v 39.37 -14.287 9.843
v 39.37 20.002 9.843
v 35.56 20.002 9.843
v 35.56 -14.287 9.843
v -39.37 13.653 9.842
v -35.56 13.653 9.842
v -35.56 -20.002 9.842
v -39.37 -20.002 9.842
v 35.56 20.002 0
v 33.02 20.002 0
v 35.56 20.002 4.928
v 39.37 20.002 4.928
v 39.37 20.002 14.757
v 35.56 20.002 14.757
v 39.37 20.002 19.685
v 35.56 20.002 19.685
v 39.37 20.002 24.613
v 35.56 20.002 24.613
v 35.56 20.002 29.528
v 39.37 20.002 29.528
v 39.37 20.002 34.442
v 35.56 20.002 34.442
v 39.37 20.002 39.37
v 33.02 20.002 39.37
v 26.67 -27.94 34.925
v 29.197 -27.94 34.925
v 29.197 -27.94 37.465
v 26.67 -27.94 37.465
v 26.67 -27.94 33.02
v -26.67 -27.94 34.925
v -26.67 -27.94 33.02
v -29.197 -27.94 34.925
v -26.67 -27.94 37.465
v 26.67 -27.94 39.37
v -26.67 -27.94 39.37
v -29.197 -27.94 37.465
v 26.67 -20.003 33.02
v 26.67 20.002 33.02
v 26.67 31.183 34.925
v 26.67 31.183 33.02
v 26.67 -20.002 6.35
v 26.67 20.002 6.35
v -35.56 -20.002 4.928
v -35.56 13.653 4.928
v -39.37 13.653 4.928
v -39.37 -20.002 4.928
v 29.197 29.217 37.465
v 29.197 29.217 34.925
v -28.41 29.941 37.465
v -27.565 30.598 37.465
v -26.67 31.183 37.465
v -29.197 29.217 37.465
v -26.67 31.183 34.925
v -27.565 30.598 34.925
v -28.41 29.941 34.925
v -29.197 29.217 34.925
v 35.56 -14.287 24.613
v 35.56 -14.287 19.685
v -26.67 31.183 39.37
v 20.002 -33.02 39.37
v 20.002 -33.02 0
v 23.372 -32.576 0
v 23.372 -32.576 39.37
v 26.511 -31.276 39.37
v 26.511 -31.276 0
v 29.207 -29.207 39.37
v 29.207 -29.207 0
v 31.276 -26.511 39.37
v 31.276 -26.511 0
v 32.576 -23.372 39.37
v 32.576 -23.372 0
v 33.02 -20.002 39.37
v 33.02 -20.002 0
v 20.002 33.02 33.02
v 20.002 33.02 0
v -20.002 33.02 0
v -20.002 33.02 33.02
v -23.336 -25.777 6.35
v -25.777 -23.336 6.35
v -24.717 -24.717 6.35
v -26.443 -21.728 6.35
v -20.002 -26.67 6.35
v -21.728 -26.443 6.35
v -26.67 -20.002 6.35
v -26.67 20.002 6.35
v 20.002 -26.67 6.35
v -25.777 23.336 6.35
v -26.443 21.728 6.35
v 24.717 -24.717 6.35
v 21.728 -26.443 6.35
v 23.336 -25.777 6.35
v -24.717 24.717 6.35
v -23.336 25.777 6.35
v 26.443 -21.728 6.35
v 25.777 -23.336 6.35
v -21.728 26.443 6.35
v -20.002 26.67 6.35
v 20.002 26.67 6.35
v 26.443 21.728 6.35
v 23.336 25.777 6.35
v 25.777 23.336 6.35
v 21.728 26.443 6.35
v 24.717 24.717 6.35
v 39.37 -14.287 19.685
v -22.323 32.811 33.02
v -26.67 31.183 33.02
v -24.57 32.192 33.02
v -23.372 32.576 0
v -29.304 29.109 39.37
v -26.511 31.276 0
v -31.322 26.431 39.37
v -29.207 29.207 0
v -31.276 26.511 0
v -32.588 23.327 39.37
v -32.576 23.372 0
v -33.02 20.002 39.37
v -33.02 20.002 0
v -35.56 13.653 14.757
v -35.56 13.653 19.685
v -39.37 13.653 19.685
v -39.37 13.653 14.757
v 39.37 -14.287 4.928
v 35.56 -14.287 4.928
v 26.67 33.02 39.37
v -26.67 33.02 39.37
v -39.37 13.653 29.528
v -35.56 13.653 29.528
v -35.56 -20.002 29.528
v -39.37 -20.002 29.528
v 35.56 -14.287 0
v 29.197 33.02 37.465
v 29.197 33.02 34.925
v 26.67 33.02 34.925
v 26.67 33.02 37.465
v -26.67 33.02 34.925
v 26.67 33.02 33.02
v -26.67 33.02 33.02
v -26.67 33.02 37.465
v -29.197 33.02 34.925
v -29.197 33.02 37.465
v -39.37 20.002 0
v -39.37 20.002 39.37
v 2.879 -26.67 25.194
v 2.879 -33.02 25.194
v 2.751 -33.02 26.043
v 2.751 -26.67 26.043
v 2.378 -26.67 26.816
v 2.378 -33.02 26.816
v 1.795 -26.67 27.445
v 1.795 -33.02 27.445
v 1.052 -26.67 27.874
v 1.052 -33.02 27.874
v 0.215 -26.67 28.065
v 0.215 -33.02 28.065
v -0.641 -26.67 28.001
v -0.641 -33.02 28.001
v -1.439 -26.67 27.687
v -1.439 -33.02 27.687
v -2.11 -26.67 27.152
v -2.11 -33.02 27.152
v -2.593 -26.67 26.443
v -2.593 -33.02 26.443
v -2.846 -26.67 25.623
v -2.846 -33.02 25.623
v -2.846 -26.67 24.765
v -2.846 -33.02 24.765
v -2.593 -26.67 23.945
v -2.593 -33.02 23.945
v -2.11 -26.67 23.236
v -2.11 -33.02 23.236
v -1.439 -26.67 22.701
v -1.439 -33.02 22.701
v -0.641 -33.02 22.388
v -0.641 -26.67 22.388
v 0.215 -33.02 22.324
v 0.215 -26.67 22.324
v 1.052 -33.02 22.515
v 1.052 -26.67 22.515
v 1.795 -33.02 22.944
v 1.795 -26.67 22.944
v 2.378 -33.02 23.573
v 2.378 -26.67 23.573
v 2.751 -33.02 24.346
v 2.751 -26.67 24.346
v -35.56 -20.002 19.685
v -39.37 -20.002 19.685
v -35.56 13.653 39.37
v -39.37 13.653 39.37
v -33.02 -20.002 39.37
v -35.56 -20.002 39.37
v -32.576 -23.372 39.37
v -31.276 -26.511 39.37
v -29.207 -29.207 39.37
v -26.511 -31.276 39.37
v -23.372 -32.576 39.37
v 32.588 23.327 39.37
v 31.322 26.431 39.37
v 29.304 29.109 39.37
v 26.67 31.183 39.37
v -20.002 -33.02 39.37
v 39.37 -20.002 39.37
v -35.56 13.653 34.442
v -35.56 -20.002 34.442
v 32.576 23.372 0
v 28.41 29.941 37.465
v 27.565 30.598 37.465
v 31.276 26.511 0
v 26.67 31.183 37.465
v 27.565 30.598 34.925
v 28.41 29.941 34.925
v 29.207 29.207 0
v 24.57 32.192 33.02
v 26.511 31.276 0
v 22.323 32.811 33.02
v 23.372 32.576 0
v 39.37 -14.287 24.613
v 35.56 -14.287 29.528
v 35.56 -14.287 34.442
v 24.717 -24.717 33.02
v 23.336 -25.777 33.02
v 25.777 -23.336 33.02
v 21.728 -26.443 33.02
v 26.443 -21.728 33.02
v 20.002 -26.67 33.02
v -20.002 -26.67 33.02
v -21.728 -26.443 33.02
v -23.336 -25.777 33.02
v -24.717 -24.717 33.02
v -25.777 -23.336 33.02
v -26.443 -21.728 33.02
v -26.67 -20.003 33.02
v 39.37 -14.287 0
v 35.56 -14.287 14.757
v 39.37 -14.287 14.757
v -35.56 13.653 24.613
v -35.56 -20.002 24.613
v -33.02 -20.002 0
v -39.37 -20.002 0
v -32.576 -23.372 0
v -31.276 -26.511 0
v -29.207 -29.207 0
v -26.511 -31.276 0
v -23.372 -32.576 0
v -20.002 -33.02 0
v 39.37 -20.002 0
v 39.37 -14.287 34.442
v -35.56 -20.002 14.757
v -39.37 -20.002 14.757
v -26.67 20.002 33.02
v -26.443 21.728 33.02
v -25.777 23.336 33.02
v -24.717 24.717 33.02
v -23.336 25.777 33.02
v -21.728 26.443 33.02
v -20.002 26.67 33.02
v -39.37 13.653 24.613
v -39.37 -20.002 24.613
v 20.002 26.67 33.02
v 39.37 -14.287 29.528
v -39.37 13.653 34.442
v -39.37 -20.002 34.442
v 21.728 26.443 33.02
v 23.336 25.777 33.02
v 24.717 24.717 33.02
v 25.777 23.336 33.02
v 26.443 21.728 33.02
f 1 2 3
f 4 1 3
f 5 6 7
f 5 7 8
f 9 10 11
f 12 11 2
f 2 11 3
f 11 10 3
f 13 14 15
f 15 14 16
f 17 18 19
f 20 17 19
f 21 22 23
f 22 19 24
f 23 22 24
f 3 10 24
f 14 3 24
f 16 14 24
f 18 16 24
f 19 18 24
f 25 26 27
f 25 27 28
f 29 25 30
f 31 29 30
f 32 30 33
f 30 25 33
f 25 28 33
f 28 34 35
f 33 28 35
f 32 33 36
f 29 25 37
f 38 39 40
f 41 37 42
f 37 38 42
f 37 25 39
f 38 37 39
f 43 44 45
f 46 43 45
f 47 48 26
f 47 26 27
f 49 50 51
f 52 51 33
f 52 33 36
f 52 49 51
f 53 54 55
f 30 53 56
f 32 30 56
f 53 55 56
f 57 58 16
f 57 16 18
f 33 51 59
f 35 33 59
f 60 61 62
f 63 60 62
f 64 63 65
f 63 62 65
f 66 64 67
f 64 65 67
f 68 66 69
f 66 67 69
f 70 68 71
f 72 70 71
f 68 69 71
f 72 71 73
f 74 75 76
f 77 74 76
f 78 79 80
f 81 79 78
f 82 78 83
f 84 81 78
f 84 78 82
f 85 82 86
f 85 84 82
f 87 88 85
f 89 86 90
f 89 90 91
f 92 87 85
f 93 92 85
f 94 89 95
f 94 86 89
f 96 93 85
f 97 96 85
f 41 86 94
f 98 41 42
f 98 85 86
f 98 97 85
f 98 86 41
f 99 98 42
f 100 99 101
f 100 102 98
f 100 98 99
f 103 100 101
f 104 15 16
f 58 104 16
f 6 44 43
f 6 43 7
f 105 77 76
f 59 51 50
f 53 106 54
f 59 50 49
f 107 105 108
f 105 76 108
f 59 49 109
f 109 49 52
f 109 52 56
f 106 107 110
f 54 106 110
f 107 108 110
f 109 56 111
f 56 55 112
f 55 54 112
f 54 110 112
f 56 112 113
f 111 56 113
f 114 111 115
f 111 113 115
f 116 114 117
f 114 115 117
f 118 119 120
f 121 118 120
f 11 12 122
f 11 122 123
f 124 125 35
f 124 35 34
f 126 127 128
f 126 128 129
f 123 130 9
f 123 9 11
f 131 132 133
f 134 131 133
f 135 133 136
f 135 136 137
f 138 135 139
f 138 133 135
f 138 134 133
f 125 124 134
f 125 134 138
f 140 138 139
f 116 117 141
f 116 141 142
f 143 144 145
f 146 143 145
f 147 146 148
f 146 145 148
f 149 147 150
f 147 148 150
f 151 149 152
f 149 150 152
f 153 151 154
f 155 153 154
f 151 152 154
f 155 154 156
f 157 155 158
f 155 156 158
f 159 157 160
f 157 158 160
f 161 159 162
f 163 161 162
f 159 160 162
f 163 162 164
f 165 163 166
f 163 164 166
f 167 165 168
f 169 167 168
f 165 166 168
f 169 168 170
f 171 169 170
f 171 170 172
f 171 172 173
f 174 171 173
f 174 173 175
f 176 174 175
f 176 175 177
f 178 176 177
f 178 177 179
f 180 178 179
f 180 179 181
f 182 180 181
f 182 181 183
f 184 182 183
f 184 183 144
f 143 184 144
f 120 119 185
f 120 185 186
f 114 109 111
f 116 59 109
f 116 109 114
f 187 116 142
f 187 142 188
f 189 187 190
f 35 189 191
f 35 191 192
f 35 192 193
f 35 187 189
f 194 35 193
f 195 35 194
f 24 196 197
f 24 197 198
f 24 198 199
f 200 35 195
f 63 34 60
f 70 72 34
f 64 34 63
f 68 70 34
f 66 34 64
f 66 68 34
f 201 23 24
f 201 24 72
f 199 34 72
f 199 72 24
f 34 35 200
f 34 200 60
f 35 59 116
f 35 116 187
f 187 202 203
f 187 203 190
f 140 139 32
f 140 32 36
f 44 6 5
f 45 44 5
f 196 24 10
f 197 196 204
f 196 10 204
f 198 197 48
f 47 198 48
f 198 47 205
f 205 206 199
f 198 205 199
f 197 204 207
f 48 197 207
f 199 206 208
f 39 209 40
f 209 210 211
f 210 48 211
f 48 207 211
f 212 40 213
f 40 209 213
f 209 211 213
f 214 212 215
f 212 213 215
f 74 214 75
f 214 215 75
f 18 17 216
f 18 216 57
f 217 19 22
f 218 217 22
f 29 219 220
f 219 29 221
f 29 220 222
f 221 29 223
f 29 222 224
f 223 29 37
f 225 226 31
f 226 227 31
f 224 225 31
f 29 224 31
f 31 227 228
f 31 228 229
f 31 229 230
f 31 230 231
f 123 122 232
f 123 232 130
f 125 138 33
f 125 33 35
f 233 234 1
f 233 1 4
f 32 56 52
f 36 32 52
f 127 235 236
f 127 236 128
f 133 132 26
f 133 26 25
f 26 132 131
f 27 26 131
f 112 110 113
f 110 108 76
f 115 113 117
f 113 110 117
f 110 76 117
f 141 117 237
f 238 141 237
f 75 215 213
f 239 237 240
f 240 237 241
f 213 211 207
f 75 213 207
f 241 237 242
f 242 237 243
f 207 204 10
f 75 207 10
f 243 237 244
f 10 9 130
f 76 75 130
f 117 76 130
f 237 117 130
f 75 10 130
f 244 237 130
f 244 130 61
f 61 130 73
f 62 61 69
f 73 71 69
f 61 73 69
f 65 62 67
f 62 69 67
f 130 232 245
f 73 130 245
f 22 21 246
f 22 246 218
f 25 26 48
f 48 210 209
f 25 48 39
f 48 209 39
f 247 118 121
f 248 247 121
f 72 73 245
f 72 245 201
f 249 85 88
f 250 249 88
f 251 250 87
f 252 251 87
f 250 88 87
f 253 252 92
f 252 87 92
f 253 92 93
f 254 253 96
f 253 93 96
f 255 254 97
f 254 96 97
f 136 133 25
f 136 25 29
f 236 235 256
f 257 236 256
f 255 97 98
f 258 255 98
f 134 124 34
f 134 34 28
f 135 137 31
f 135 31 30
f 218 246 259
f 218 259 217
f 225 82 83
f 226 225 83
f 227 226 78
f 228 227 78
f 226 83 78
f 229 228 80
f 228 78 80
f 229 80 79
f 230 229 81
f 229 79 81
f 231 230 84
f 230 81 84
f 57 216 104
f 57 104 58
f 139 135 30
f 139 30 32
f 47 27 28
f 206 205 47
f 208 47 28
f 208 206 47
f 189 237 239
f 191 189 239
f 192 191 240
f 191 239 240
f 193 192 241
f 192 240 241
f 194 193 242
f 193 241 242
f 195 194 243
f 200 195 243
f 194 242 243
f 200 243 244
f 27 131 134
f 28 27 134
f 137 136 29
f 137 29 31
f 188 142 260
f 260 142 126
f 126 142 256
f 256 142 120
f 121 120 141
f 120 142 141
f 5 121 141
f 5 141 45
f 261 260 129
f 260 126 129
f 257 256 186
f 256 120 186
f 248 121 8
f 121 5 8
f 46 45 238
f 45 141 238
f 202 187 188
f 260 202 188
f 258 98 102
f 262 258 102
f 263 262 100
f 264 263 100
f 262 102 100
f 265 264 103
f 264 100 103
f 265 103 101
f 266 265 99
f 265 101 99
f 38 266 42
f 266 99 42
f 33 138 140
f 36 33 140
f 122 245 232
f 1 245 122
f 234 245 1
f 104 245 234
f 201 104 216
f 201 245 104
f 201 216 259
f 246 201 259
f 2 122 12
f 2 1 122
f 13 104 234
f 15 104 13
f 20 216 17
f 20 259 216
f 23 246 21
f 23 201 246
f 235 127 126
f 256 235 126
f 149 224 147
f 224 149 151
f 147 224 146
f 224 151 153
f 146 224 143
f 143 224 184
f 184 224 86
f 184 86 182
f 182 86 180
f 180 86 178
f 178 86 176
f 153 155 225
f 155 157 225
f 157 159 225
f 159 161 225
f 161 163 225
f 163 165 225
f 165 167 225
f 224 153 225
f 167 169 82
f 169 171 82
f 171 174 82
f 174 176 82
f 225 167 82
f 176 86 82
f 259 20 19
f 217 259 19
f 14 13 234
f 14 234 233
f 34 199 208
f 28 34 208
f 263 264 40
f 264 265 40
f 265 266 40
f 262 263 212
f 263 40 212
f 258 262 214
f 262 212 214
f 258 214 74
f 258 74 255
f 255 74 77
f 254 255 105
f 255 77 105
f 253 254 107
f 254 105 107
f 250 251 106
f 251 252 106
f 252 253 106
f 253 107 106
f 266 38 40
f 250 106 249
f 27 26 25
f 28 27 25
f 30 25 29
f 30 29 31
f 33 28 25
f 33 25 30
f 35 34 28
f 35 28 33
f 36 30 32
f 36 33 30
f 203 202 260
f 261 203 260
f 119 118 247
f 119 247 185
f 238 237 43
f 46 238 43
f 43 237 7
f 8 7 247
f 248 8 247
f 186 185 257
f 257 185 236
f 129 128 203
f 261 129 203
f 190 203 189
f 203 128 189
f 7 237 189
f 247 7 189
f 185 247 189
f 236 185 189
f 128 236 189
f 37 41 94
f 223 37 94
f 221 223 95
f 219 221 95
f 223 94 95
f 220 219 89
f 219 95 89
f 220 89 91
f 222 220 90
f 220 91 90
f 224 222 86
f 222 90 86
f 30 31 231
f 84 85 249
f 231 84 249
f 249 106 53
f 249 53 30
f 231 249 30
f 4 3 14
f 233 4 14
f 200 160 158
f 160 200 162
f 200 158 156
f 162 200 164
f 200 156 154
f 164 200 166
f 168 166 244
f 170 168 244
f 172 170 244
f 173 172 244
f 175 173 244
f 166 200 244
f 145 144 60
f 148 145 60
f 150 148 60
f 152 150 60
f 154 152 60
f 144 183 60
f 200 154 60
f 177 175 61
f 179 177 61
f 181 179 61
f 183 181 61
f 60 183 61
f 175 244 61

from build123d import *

# Parameters (mm, degrees)
F1_DEPTH  = 39.37
F2_DEPTH  = 6.35
F3_W      = 2.5273
F3_H      = 2.54
F4_DEPTH  = 60.96
F5_DEPTH  = 60.96
F6_W      = 40.005
F6_H      = 39.37
F7_DEPTH  = 6.35
F9_DEPTH  = 6.35
F8_W      = 3.81
F8_H      = 4.9149
F8_H_2    = 4.9276
F10_DEPTH = 34.29
F11_START = -6.35
F11_DEPTH = 41.148
F12_R     = 2.8785443145
F13_DEPTH = 8.89


with BuildPart() as f1:
    # F0 (on Top) → F1 (new body)
    with BuildSketch(Plane.XY):
        with BuildLine():
            Line((20.0025, 33.02), (-20.0025, 33.02))
            ThreePointArc((-20.0025, 33.02), (-29.2072625241, 29.2072625241), (-33.02, 20.0025))
            Line((-33.02, 20.0025), (-33.02, -20.0025))
            ThreePointArc((-33.02, -20.0025), (-29.2072625241, -29.2072625241), (-20.0025, -33.02))
            Line((-20.0025, -33.02), (20.0025, -33.02))
            ThreePointArc((20.0025, -33.02), (29.2072625241, -29.2072625241), (33.02, -20.0025))
            Line((33.02, -20.0025), (33.02, 20.0025))
            ThreePointArc((33.02, 20.0025), (29.2072625241, 29.2072625241), (20.0025, 33.02))
        make_face()
        with BuildLine():
            ThreePointArc((-26.67, 20.0025), (-24.7171344636, 24.7171344636), (-20.0025, 26.67))
            Line((-20.0025, 26.67), (20.0025, 26.67))
            ThreePointArc((20.0025, 26.67), (24.7171344636, 24.7171344636), (26.67, 20.0025))
            Line((26.67, 20.0025), (26.67, -20.0025))
            ThreePointArc((26.67, -20.0025), (24.7171344636, -24.7171344636), (20.0025, -26.67))
            Line((20.0025, -26.67), (-20.0025, -26.67))
            ThreePointArc((-20.0025, -26.67), (-24.7171344636, -24.7171344636), (-26.67, -20.0025))
            Line((-26.67, -20.0025), (-26.67, 20.0025))
        make_face(mode=Mode.SUBTRACT)
    extrude(amount=F1_DEPTH)

    # F0 (on Top) → F2 (join)
    with BuildSketch(Plane.XY):
        with BuildLine():
            Line((20.0025, 26.67), (-20.0025, 26.67))
            ThreePointArc((-20.0025, 26.67), (-24.7171344636, 24.7171344636), (-26.67, 20.0025))
            Line((-26.67, 20.0025), (-26.67, -20.0025))
            ThreePointArc((-26.67, -20.0025), (-24.7171344636, -24.7171344636), (-20.0025, -26.67))
            Line((-20.0025, -26.67), (20.0025, -26.67))
            ThreePointArc((20.0025, -26.67), (24.7171344636, -24.7171344636), (26.67, -20.0025))
            Line((26.67, -20.0025), (26.67, 20.0025))
            ThreePointArc((26.67, 20.0025), (24.7171344636, 24.7171344636), (20.0025, 26.67))
        make_face()
    extrude(amount=F2_DEPTH)

    # F3 (on face) → F4 (cut)
    with BuildSketch(Plane(origin=(0, 33.02, 0), x_dir=(-1, 0, 0), z_dir=(0, 1, 0))):
        with Locations((-27.93365, 36.195)):
            Rectangle(F3_W, F3_H)
        with Locations((27.93365, 36.195)):
            Rectangle(F3_W, F3_H)
        Polygon((20.0025, 39.37), (0, 39.37), (-20.0025, 39.37), (-20.0025, 33.02), (20.0025, 33.02), align=None)
        Polygon((-20.0025, 33.02), (-20.0025, 39.37), (-26.67, 39.37), (-26.67, 37.465), (-26.67, 34.925), (-26.67, 33.02), align=None)
        Polygon((26.67, 39.37), (20.0025, 39.37), (20.0025, 33.02), (26.67, 33.02), (26.67, 34.925), (26.67, 37.465), align=None)
    extrude(amount=-F4_DEPTH, mode=Mode.SUBTRACT)

    # F6 (on face) → F7 (join)
    with BuildSketch(Plane.YZ.offset(33.02)):
        with Locations((0, 19.685)):
            Rectangle(F6_W, F6_H)
    extrude(amount=F7_DEPTH)

    # F9 (add): a face of the model
    f9_faces = [f1.faces().sort_by_distance(p)[0] for p in [
        (-33.02, 0, 19.685),
    ]]
    extrude(f9_faces, amount=F9_DEPTH)

    # F8 (on face) → F10 (cut)
    with BuildSketch(Plane(origin=(0, 20.0025, 0), x_dir=(-1, 0, 0), z_dir=(0, 1, 0))):
        with Locations((-37.465, 31.98495)):
            Rectangle(F8_W, F8_H)
        with Locations((-37.465, 22.1488)):
            Rectangle(F8_W, F8_H_2)
        with Locations((-37.465, 12.29995)):
            Rectangle(F8_W, F8_H)
        with Locations((-37.465, 2.4638)):
            Rectangle(F8_W, F8_H_2)
    extrude(amount=-F10_DEPTH, mode=Mode.SUBTRACT)

    # F8 (on face) → F11 (cut)
    with BuildSketch(Plane(origin=(0, 20.0025, 0), x_dir=(-1, 0, 0), z_dir=(0, 1, 0)).offset(F11_START)):
        with Locations((37.465, 36.9062)):
            Rectangle(F8_W, F8_H_2)
        with Locations((37.465, 27.07005)):
            Rectangle(F8_W, F8_H)
        with Locations((37.465, 17.2212)):
            Rectangle(F8_W, F8_H_2)
        with Locations((37.465, 7.38505)):
            Rectangle(F8_W, F8_H)
    extrude(amount=-F11_DEPTH, mode=Mode.SUBTRACT)

    # F12 (on face) → F13 (cut)
    with BuildSketch(Plane.XZ.offset(33.02)):
        with Locations((0, 25.1943469048)):
            Circle(F12_R)
    extrude(amount=-F13_DEPTH, mode=Mode.SUBTRACT)


with BuildPart() as f5:
    # F3 (on face) → F5 (new body)
    with BuildSketch(Plane(origin=(0, 33.02, 0), x_dir=(-1, 0, 0), z_dir=(0, 1, 0))):
        with Locations((27.93365, 36.195)):
            Rectangle(F3_W, F3_H)
        Polygon((20.0025, 39.37), (0, 39.37), (-20.0025, 39.37), (-20.0025, 33.02), (20.0025, 33.02), align=None)
        Polygon((26.67, 39.37), (20.0025, 39.37), (20.0025, 33.02), (26.67, 33.02), (26.67, 34.925), (26.67, 37.465), align=None)
        Polygon((-20.0025, 33.02), (-20.0025, 39.37), (-26.67, 39.37), (-26.67, 37.465), (-26.67, 34.925), (-26.67, 33.02), align=None)
        with Locations((-27.93365, 36.195)):
            Rectangle(F3_W, F3_H)
    extrude(amount=-F5_DEPTH)


solid = Compound([f1.part, f5.part])
